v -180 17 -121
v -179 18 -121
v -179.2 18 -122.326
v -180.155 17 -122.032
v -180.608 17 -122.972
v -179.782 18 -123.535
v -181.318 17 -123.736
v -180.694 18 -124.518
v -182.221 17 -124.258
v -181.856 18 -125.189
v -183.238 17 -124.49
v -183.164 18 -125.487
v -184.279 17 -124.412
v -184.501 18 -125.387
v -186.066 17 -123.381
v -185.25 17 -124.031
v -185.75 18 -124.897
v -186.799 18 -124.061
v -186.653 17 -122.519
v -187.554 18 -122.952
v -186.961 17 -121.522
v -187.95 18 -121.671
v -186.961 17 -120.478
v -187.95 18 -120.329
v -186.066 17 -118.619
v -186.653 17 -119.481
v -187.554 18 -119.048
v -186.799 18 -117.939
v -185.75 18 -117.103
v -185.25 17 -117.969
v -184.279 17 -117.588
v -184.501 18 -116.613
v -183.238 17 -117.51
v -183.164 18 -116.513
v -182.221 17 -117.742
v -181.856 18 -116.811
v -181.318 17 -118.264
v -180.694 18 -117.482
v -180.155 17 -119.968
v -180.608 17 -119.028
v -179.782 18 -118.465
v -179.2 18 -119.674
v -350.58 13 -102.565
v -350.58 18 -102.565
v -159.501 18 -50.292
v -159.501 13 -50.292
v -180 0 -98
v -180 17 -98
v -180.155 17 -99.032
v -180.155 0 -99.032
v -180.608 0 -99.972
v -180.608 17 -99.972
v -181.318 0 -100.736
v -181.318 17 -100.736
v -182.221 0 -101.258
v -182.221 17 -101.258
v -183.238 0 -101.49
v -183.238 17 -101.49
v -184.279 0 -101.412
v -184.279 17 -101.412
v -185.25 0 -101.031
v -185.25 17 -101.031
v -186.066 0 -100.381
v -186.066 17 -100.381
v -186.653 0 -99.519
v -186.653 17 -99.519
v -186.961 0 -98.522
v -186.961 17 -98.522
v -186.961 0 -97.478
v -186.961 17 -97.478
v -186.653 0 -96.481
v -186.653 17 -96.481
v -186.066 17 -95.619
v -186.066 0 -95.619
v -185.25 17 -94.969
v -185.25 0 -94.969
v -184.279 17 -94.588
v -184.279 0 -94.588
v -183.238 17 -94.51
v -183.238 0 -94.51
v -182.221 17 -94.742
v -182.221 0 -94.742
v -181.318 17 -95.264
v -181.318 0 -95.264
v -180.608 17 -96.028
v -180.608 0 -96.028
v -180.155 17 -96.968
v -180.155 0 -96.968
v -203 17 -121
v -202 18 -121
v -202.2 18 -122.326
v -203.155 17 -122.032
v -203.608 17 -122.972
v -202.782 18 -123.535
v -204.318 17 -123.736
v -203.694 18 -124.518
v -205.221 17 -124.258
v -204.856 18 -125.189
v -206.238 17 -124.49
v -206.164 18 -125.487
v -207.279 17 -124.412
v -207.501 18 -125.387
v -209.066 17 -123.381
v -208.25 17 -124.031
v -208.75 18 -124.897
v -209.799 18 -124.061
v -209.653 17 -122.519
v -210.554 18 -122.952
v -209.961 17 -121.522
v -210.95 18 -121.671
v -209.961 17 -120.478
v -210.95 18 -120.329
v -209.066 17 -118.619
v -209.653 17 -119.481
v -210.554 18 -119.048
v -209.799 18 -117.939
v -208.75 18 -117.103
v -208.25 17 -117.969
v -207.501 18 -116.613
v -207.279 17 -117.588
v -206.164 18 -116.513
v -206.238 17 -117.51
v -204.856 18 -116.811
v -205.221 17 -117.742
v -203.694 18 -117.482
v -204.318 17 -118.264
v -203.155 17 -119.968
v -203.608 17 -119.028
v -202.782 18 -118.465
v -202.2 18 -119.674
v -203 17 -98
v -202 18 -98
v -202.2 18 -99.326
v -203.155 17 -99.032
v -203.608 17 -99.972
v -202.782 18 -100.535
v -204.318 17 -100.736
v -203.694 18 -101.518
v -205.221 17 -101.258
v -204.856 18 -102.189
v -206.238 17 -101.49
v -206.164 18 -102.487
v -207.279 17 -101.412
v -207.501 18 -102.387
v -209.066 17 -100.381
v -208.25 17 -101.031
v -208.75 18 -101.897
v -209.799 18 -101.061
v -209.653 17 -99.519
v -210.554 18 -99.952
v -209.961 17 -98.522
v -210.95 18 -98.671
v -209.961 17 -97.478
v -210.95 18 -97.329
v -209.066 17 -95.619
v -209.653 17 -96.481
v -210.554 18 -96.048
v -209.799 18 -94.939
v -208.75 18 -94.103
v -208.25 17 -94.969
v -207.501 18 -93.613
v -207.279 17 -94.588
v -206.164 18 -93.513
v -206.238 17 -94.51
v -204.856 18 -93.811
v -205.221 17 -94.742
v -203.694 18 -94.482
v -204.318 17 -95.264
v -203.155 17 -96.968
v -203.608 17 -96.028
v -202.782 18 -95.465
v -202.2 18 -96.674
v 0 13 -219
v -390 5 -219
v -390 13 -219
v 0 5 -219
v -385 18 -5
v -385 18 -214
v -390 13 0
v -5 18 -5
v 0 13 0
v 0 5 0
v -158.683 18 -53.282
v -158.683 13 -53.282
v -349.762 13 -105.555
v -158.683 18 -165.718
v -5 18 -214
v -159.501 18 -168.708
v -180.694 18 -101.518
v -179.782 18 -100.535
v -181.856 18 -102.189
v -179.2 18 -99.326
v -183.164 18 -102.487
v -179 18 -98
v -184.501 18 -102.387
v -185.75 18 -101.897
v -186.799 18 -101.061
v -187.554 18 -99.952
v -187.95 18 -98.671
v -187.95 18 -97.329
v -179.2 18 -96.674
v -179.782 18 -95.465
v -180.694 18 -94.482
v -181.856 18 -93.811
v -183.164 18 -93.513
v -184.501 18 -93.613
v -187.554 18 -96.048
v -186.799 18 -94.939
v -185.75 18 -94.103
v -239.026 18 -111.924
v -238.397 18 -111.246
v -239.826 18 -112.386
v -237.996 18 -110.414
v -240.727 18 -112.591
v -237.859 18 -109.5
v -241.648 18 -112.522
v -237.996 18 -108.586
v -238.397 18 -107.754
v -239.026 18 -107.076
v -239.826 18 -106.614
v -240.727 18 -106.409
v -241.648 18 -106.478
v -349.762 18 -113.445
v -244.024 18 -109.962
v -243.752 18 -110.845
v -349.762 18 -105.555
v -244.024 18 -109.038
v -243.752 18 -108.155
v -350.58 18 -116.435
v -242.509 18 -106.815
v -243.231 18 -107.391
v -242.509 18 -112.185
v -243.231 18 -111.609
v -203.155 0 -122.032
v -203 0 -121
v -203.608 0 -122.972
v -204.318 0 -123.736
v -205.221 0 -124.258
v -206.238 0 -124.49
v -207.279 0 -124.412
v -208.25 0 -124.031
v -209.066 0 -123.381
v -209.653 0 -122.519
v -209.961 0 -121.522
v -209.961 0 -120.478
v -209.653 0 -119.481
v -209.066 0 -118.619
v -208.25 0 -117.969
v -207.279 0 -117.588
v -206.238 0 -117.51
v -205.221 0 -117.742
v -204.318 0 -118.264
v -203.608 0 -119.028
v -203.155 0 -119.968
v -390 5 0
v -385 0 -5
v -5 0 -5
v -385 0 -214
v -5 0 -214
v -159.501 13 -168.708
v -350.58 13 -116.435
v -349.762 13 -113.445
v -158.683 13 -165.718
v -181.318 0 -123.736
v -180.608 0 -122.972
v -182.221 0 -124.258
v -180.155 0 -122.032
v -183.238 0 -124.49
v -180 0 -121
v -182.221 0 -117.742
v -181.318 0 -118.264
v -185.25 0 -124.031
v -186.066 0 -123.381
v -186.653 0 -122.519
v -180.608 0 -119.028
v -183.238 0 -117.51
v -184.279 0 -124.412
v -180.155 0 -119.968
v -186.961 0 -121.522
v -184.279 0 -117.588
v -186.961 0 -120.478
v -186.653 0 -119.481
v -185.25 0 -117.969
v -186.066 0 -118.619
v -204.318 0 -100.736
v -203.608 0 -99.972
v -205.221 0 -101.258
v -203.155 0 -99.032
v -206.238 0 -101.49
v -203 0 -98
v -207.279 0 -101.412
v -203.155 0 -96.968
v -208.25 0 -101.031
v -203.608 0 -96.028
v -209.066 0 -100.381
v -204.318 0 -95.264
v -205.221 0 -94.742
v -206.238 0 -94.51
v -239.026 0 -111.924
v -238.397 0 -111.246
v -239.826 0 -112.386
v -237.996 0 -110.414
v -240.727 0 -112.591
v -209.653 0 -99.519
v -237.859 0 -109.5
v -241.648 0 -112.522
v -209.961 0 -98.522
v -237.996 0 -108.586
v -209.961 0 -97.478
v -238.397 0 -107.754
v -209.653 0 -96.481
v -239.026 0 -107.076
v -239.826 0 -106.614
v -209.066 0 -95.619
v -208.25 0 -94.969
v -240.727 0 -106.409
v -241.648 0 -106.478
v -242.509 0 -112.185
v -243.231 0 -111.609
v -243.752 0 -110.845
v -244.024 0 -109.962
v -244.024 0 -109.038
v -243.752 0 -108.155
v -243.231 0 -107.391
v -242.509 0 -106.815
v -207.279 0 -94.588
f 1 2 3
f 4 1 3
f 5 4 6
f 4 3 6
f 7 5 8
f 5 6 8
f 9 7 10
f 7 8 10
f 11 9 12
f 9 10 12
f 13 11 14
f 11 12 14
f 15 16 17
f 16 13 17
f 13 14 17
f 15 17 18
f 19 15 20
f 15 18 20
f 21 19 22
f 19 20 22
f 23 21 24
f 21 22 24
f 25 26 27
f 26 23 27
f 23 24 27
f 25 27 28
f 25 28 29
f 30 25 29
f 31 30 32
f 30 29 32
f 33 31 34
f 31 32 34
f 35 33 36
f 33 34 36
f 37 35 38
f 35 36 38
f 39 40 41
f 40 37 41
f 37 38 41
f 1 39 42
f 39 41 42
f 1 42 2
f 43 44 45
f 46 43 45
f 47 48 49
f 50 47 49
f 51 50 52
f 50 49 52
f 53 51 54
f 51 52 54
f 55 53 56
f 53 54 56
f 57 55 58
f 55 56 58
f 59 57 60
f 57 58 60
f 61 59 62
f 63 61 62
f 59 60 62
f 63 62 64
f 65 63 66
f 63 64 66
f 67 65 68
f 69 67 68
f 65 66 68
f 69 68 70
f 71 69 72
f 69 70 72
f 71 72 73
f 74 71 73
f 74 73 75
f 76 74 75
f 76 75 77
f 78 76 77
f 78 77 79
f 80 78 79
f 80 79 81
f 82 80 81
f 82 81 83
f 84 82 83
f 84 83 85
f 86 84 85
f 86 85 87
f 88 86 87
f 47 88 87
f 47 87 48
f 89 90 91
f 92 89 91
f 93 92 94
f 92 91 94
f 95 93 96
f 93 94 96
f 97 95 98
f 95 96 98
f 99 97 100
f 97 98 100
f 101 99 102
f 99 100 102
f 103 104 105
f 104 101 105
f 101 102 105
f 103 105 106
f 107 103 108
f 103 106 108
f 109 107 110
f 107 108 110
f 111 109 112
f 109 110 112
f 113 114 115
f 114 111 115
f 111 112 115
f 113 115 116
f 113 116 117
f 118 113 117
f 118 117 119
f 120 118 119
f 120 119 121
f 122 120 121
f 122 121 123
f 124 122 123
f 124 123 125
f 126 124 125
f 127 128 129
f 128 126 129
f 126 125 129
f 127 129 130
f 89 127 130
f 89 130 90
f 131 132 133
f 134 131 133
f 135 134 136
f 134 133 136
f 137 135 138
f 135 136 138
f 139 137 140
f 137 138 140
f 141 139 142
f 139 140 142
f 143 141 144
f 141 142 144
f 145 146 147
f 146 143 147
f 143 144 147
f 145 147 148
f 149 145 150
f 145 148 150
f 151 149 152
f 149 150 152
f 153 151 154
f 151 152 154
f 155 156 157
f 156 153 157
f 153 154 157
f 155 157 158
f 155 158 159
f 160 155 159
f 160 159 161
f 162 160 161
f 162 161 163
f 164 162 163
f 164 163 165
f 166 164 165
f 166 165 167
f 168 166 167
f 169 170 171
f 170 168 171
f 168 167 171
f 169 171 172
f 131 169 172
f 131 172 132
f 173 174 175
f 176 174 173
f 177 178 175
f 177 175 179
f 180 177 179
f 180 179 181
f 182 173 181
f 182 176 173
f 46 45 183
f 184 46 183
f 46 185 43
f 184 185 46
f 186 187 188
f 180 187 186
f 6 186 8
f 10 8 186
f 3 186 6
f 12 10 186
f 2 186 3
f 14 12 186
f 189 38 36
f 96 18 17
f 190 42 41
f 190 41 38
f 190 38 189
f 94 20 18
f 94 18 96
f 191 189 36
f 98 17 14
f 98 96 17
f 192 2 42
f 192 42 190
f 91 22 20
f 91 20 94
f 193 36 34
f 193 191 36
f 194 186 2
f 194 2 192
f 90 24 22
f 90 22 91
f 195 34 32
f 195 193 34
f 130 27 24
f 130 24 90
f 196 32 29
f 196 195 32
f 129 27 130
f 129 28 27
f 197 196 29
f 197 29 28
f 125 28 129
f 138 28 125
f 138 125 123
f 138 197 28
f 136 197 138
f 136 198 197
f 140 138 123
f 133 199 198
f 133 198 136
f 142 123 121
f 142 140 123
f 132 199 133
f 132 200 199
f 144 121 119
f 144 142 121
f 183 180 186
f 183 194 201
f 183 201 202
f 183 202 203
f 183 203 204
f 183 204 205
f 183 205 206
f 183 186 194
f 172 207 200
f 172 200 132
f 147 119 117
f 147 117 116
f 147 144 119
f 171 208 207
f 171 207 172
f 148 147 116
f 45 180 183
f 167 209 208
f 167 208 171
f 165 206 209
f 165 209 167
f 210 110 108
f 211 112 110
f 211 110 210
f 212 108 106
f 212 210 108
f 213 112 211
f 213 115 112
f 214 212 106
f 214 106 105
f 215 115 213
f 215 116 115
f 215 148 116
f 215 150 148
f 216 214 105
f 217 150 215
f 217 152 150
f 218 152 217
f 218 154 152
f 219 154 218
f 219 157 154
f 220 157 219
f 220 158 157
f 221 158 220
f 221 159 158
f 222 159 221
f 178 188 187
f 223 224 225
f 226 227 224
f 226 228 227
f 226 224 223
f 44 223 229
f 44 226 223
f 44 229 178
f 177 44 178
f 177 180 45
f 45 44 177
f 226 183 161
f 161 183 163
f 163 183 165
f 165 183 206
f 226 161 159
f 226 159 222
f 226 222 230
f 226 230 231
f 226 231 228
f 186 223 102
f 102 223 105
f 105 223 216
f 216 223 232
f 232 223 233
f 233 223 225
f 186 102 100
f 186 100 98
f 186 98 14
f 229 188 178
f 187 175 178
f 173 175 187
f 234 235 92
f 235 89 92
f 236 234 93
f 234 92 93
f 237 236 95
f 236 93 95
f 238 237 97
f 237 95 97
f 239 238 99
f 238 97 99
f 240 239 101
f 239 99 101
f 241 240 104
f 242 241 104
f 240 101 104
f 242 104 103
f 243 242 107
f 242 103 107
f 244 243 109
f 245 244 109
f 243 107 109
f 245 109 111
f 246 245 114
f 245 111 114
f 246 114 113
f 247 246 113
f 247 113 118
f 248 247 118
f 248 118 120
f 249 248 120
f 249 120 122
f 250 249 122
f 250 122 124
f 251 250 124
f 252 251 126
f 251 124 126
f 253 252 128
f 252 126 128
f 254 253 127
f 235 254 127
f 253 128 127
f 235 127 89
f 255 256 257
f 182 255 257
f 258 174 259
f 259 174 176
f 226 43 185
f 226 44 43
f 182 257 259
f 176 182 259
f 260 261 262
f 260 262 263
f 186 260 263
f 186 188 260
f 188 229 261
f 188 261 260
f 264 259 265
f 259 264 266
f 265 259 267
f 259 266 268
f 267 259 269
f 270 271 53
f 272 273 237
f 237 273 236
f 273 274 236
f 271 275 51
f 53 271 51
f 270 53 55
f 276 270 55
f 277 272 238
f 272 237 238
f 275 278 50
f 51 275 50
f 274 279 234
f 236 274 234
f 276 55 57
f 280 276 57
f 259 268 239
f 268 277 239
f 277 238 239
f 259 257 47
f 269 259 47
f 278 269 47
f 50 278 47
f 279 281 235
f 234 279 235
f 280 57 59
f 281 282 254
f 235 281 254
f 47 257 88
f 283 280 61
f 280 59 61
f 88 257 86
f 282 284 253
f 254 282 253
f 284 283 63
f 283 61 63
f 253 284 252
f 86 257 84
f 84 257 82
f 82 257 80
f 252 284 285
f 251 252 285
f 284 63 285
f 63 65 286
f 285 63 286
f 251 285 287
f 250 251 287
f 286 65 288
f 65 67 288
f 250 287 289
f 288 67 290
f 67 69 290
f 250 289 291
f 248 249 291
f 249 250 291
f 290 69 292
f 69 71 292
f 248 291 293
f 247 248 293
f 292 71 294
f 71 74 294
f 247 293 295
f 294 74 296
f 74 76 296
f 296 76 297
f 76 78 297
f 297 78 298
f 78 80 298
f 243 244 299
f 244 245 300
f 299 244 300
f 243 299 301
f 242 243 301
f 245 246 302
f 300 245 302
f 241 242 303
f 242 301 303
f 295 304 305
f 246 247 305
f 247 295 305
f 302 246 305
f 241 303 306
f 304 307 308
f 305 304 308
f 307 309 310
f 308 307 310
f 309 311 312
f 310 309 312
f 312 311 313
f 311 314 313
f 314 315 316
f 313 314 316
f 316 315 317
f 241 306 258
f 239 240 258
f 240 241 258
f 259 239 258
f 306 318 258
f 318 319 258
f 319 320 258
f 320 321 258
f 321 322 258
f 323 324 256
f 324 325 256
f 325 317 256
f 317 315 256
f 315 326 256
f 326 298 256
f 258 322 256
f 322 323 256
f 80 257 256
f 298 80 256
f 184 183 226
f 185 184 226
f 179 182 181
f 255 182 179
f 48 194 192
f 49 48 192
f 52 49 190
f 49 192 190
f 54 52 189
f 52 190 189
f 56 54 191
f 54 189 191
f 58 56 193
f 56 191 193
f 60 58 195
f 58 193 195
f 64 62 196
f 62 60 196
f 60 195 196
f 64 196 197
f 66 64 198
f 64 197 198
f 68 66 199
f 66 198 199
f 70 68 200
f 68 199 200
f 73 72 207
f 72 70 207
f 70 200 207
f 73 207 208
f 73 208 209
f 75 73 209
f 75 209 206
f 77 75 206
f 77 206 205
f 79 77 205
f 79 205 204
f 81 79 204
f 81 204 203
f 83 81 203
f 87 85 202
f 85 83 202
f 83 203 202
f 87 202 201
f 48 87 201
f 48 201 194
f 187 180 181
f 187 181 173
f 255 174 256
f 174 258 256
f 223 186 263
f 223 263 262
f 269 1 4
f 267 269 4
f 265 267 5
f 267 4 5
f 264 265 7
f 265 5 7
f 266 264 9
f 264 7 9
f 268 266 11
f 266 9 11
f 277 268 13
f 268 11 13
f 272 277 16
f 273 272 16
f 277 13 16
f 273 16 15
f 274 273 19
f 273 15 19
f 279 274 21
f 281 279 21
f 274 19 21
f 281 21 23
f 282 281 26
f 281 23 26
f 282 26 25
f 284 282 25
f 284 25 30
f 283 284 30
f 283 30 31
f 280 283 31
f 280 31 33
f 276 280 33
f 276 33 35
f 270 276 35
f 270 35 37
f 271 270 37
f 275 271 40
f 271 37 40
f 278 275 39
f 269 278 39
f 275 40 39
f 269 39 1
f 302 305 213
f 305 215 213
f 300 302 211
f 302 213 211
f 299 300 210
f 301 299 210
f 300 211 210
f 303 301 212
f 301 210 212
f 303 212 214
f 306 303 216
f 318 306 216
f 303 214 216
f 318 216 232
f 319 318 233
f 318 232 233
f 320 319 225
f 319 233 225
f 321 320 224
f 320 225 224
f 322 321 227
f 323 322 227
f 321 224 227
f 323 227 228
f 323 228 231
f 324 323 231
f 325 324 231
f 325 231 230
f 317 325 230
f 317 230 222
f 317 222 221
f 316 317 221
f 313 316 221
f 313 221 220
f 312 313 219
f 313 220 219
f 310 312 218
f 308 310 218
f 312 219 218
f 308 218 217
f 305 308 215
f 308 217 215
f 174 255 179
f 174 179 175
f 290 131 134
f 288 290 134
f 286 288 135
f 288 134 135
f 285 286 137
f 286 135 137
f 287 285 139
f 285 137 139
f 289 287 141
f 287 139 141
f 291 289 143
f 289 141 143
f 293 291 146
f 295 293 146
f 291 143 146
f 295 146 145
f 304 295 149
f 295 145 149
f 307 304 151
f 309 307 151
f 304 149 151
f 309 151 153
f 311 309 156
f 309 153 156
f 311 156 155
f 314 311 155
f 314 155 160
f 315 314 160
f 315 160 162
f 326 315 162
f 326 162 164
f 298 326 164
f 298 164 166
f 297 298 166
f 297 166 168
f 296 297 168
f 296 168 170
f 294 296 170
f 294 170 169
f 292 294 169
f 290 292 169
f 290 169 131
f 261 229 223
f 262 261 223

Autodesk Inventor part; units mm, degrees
ref_plane "YZ Plane" through (0, 0, 0) normal (1, 0, 0) x (0, 1, 0)
ref_plane "XZ Plane" through (0, 0, 0) normal (0, 1, 0) x (-1, 0, 0)
ref_plane "XY Plane" through (0, 0, 0) normal (0, 0, 1) x (1, 0, 0)
sketch "Sketch1" plane through (0, 0, 0) normal (0, 1, 0) x (-1, 0, 0)
  line L0 (0, 0) -> (390, 0)
  line L1 (390, 0) -> (390, -219)
  line L2 (390, -219) -> (0, -219)
  line L3 (0, -219) -> (0, 0)
  dimension "d0" = 219
  dimension "d1" = 390
extrude "Platform" add sketch "Sketch1" along normal blind 18
sketch "Sketch3" plane through (0, 18, 0) normal (0, 1, 0) x (1, 0, 0)
  circle A0 centre (-240.9586, 109.5) radius 3.1
  line L0 (0, 0) -> (0, 219) projected
  line L1 (-390, 0) -> (0, 0) projected
  line L2 (-229.5, 144) -> (-160.5, 144)
  line L3 (-160.5, 144) -> (-160.5, 75)
  line L4 (-160.5, 75) -> (-229.5, 75)
  line L5 (-229.5, 75) -> (-229.5, 144)
  line L6 (-206.5, 121) -> (-183.5, 98)
  circle A1 centre (-206.5, 121) radius 3.5
  circle A2 centre (-183.5, 98) radius 3.5
  circle A3 centre (-183.5, 121) radius 3.5
  circle A4 centre (-206.5, 98) radius 3.5
  line L7 (-206.5, 98) -> (-183.5, 121)
  point P0 (0, 109.5)
  point P1 (-195, 109.5)
  point P2 (-160.5, 109.5)
  point P3 (-195, 144)
  point P4 (0, 109.5)
  point P5 (-195, 0)
  dimension "screwdiameter" = 6.2
  dimension "d34" = 69
  dimension "d35" = 69
  dimension "d36" = 7
  dimension "d37" = 7
  dimension "d38" = 7
  dimension "d39" = 7
  dimension "d43" = 23
extrude "ScrewHole" cut sketch "Sketch3" against normal through all contours A0 | A3 | A2 | A4 | A1
sketch "Sketch2" plane through (0, 18, 0) normal (0, 1, 0) x (1, 0, 0)
  line L0 (-364.182, 109.5) -> (-365, 112.4901)
  line L1 (-365, 112.4901) -> (-145.0809, 172.6532)
  line L2 (-145.0809, 172.6532) -> (-144.2629, 169.6631)
  line L3 (-144.2629, 169.6631) -> (-364.182, 109.5)
  line L4 (0, 0) -> (0, 219) projected
  line L5 (18.6218, 109.5) -> (45.6135, 109.5)
  line L6 (-390, 0) -> (0, 0) projected
  line L7 (-364.182, 109.5) -> (-365, 106.5099)
  line L8 (-365, 106.5099) -> (-145.0809, 46.3468)
  line L9 (-145.0809, 46.3468) -> (-144.2629, 49.3369)
  line L10 (-144.2629, 49.3369) -> (-364.182, 109.5)
  line L11 (-350.5799, 116.435) -> (-349.7619, 113.4449)
  line L12 (-159.501, 168.7083) -> (-158.683, 165.7182)
  line L13 (-350.5799, 102.565) -> (-349.7619, 105.5551)
  line L14 (-159.501, 50.2917) -> (-158.683, 53.2818)
  line L15 (-390, 219) -> (-390, 0) projected
  point P0 (32.1177, 109.5)
  point P1 (0, 109.5)
  point P2 (-195, 0)
  point P3 (-254.2224, 139.5815)
  point P4 (-159.501, 50.2917)
  point P5 (-158.683, 53.2818)
  point P6 (-350.5799, 102.565)
  dimension "d6" = 3.1
  dimension "beta" = 15.3
  dimension "rail" = 228
  dimension "centre_offset" = 0
  dimension "offsetlength" = 14.95
  dimension "d20" = 14.95
  dimension "d44" = 198.1
  dimension "d52" = 25
extrude "Slots" cut sketch "Sketch2" against normal blind 5 contours L11 L1 L12 L3 | L10 L14 L8 L13
chamfer "Chamfer1" distance 5 angle 45 8 edges at (-390, 18, -109.5) (-195, 18, 0) (-195, 18, -219) (0, 18, -109.5) (0, 0, -109.5) (-195, 0, 0) (-390, 0, -109.5) (-195, 0, -219)
chamfer "Countersunk" distance 1 angle 45 4 edges at (-210, 18, -98) (-210, 18, -121) (-187, 18, -121) (-187, 18, -98)
sketch "InstructionsSticker" plane through (0, 18, 0) normal (0, 1, 0) x (1, 0, 0)
  line L0 (-120, 15) -> (-15, 15)
  line L1 (-15, 15) -> (-15, 204)
  line L2 (-15, 204) -> (-120, 204)
  line L3 (-120, 204) -> (-120, 15)
  line L4 (0, 219) -> (-390, 219) projected
  line L5 (-390, 0) -> (0, 0) projected
  line L6 (0, 0) -> (0, 219) projected
  line L7 (-120, 204) -> (-15.0037, 204) construction
  line L8 (-15.0037, 204) -> (-15.0037, 14.9979) construction
  line L9 (-15.0037, 14.9979) -> (-120, 14.9979) construction
  line L10 (-120, 14.9979) -> (-120, 204) construction
  dimension "d53" = 105
  dimension "d54" = 15
  dimension "d55" = 15
  dimension "d56" = 15
  dimension "d58" = 189
equation "\"d20\" = offsetlength"
equation "\"gluegap\" = 0.1"
properties part number "platform_instr"
